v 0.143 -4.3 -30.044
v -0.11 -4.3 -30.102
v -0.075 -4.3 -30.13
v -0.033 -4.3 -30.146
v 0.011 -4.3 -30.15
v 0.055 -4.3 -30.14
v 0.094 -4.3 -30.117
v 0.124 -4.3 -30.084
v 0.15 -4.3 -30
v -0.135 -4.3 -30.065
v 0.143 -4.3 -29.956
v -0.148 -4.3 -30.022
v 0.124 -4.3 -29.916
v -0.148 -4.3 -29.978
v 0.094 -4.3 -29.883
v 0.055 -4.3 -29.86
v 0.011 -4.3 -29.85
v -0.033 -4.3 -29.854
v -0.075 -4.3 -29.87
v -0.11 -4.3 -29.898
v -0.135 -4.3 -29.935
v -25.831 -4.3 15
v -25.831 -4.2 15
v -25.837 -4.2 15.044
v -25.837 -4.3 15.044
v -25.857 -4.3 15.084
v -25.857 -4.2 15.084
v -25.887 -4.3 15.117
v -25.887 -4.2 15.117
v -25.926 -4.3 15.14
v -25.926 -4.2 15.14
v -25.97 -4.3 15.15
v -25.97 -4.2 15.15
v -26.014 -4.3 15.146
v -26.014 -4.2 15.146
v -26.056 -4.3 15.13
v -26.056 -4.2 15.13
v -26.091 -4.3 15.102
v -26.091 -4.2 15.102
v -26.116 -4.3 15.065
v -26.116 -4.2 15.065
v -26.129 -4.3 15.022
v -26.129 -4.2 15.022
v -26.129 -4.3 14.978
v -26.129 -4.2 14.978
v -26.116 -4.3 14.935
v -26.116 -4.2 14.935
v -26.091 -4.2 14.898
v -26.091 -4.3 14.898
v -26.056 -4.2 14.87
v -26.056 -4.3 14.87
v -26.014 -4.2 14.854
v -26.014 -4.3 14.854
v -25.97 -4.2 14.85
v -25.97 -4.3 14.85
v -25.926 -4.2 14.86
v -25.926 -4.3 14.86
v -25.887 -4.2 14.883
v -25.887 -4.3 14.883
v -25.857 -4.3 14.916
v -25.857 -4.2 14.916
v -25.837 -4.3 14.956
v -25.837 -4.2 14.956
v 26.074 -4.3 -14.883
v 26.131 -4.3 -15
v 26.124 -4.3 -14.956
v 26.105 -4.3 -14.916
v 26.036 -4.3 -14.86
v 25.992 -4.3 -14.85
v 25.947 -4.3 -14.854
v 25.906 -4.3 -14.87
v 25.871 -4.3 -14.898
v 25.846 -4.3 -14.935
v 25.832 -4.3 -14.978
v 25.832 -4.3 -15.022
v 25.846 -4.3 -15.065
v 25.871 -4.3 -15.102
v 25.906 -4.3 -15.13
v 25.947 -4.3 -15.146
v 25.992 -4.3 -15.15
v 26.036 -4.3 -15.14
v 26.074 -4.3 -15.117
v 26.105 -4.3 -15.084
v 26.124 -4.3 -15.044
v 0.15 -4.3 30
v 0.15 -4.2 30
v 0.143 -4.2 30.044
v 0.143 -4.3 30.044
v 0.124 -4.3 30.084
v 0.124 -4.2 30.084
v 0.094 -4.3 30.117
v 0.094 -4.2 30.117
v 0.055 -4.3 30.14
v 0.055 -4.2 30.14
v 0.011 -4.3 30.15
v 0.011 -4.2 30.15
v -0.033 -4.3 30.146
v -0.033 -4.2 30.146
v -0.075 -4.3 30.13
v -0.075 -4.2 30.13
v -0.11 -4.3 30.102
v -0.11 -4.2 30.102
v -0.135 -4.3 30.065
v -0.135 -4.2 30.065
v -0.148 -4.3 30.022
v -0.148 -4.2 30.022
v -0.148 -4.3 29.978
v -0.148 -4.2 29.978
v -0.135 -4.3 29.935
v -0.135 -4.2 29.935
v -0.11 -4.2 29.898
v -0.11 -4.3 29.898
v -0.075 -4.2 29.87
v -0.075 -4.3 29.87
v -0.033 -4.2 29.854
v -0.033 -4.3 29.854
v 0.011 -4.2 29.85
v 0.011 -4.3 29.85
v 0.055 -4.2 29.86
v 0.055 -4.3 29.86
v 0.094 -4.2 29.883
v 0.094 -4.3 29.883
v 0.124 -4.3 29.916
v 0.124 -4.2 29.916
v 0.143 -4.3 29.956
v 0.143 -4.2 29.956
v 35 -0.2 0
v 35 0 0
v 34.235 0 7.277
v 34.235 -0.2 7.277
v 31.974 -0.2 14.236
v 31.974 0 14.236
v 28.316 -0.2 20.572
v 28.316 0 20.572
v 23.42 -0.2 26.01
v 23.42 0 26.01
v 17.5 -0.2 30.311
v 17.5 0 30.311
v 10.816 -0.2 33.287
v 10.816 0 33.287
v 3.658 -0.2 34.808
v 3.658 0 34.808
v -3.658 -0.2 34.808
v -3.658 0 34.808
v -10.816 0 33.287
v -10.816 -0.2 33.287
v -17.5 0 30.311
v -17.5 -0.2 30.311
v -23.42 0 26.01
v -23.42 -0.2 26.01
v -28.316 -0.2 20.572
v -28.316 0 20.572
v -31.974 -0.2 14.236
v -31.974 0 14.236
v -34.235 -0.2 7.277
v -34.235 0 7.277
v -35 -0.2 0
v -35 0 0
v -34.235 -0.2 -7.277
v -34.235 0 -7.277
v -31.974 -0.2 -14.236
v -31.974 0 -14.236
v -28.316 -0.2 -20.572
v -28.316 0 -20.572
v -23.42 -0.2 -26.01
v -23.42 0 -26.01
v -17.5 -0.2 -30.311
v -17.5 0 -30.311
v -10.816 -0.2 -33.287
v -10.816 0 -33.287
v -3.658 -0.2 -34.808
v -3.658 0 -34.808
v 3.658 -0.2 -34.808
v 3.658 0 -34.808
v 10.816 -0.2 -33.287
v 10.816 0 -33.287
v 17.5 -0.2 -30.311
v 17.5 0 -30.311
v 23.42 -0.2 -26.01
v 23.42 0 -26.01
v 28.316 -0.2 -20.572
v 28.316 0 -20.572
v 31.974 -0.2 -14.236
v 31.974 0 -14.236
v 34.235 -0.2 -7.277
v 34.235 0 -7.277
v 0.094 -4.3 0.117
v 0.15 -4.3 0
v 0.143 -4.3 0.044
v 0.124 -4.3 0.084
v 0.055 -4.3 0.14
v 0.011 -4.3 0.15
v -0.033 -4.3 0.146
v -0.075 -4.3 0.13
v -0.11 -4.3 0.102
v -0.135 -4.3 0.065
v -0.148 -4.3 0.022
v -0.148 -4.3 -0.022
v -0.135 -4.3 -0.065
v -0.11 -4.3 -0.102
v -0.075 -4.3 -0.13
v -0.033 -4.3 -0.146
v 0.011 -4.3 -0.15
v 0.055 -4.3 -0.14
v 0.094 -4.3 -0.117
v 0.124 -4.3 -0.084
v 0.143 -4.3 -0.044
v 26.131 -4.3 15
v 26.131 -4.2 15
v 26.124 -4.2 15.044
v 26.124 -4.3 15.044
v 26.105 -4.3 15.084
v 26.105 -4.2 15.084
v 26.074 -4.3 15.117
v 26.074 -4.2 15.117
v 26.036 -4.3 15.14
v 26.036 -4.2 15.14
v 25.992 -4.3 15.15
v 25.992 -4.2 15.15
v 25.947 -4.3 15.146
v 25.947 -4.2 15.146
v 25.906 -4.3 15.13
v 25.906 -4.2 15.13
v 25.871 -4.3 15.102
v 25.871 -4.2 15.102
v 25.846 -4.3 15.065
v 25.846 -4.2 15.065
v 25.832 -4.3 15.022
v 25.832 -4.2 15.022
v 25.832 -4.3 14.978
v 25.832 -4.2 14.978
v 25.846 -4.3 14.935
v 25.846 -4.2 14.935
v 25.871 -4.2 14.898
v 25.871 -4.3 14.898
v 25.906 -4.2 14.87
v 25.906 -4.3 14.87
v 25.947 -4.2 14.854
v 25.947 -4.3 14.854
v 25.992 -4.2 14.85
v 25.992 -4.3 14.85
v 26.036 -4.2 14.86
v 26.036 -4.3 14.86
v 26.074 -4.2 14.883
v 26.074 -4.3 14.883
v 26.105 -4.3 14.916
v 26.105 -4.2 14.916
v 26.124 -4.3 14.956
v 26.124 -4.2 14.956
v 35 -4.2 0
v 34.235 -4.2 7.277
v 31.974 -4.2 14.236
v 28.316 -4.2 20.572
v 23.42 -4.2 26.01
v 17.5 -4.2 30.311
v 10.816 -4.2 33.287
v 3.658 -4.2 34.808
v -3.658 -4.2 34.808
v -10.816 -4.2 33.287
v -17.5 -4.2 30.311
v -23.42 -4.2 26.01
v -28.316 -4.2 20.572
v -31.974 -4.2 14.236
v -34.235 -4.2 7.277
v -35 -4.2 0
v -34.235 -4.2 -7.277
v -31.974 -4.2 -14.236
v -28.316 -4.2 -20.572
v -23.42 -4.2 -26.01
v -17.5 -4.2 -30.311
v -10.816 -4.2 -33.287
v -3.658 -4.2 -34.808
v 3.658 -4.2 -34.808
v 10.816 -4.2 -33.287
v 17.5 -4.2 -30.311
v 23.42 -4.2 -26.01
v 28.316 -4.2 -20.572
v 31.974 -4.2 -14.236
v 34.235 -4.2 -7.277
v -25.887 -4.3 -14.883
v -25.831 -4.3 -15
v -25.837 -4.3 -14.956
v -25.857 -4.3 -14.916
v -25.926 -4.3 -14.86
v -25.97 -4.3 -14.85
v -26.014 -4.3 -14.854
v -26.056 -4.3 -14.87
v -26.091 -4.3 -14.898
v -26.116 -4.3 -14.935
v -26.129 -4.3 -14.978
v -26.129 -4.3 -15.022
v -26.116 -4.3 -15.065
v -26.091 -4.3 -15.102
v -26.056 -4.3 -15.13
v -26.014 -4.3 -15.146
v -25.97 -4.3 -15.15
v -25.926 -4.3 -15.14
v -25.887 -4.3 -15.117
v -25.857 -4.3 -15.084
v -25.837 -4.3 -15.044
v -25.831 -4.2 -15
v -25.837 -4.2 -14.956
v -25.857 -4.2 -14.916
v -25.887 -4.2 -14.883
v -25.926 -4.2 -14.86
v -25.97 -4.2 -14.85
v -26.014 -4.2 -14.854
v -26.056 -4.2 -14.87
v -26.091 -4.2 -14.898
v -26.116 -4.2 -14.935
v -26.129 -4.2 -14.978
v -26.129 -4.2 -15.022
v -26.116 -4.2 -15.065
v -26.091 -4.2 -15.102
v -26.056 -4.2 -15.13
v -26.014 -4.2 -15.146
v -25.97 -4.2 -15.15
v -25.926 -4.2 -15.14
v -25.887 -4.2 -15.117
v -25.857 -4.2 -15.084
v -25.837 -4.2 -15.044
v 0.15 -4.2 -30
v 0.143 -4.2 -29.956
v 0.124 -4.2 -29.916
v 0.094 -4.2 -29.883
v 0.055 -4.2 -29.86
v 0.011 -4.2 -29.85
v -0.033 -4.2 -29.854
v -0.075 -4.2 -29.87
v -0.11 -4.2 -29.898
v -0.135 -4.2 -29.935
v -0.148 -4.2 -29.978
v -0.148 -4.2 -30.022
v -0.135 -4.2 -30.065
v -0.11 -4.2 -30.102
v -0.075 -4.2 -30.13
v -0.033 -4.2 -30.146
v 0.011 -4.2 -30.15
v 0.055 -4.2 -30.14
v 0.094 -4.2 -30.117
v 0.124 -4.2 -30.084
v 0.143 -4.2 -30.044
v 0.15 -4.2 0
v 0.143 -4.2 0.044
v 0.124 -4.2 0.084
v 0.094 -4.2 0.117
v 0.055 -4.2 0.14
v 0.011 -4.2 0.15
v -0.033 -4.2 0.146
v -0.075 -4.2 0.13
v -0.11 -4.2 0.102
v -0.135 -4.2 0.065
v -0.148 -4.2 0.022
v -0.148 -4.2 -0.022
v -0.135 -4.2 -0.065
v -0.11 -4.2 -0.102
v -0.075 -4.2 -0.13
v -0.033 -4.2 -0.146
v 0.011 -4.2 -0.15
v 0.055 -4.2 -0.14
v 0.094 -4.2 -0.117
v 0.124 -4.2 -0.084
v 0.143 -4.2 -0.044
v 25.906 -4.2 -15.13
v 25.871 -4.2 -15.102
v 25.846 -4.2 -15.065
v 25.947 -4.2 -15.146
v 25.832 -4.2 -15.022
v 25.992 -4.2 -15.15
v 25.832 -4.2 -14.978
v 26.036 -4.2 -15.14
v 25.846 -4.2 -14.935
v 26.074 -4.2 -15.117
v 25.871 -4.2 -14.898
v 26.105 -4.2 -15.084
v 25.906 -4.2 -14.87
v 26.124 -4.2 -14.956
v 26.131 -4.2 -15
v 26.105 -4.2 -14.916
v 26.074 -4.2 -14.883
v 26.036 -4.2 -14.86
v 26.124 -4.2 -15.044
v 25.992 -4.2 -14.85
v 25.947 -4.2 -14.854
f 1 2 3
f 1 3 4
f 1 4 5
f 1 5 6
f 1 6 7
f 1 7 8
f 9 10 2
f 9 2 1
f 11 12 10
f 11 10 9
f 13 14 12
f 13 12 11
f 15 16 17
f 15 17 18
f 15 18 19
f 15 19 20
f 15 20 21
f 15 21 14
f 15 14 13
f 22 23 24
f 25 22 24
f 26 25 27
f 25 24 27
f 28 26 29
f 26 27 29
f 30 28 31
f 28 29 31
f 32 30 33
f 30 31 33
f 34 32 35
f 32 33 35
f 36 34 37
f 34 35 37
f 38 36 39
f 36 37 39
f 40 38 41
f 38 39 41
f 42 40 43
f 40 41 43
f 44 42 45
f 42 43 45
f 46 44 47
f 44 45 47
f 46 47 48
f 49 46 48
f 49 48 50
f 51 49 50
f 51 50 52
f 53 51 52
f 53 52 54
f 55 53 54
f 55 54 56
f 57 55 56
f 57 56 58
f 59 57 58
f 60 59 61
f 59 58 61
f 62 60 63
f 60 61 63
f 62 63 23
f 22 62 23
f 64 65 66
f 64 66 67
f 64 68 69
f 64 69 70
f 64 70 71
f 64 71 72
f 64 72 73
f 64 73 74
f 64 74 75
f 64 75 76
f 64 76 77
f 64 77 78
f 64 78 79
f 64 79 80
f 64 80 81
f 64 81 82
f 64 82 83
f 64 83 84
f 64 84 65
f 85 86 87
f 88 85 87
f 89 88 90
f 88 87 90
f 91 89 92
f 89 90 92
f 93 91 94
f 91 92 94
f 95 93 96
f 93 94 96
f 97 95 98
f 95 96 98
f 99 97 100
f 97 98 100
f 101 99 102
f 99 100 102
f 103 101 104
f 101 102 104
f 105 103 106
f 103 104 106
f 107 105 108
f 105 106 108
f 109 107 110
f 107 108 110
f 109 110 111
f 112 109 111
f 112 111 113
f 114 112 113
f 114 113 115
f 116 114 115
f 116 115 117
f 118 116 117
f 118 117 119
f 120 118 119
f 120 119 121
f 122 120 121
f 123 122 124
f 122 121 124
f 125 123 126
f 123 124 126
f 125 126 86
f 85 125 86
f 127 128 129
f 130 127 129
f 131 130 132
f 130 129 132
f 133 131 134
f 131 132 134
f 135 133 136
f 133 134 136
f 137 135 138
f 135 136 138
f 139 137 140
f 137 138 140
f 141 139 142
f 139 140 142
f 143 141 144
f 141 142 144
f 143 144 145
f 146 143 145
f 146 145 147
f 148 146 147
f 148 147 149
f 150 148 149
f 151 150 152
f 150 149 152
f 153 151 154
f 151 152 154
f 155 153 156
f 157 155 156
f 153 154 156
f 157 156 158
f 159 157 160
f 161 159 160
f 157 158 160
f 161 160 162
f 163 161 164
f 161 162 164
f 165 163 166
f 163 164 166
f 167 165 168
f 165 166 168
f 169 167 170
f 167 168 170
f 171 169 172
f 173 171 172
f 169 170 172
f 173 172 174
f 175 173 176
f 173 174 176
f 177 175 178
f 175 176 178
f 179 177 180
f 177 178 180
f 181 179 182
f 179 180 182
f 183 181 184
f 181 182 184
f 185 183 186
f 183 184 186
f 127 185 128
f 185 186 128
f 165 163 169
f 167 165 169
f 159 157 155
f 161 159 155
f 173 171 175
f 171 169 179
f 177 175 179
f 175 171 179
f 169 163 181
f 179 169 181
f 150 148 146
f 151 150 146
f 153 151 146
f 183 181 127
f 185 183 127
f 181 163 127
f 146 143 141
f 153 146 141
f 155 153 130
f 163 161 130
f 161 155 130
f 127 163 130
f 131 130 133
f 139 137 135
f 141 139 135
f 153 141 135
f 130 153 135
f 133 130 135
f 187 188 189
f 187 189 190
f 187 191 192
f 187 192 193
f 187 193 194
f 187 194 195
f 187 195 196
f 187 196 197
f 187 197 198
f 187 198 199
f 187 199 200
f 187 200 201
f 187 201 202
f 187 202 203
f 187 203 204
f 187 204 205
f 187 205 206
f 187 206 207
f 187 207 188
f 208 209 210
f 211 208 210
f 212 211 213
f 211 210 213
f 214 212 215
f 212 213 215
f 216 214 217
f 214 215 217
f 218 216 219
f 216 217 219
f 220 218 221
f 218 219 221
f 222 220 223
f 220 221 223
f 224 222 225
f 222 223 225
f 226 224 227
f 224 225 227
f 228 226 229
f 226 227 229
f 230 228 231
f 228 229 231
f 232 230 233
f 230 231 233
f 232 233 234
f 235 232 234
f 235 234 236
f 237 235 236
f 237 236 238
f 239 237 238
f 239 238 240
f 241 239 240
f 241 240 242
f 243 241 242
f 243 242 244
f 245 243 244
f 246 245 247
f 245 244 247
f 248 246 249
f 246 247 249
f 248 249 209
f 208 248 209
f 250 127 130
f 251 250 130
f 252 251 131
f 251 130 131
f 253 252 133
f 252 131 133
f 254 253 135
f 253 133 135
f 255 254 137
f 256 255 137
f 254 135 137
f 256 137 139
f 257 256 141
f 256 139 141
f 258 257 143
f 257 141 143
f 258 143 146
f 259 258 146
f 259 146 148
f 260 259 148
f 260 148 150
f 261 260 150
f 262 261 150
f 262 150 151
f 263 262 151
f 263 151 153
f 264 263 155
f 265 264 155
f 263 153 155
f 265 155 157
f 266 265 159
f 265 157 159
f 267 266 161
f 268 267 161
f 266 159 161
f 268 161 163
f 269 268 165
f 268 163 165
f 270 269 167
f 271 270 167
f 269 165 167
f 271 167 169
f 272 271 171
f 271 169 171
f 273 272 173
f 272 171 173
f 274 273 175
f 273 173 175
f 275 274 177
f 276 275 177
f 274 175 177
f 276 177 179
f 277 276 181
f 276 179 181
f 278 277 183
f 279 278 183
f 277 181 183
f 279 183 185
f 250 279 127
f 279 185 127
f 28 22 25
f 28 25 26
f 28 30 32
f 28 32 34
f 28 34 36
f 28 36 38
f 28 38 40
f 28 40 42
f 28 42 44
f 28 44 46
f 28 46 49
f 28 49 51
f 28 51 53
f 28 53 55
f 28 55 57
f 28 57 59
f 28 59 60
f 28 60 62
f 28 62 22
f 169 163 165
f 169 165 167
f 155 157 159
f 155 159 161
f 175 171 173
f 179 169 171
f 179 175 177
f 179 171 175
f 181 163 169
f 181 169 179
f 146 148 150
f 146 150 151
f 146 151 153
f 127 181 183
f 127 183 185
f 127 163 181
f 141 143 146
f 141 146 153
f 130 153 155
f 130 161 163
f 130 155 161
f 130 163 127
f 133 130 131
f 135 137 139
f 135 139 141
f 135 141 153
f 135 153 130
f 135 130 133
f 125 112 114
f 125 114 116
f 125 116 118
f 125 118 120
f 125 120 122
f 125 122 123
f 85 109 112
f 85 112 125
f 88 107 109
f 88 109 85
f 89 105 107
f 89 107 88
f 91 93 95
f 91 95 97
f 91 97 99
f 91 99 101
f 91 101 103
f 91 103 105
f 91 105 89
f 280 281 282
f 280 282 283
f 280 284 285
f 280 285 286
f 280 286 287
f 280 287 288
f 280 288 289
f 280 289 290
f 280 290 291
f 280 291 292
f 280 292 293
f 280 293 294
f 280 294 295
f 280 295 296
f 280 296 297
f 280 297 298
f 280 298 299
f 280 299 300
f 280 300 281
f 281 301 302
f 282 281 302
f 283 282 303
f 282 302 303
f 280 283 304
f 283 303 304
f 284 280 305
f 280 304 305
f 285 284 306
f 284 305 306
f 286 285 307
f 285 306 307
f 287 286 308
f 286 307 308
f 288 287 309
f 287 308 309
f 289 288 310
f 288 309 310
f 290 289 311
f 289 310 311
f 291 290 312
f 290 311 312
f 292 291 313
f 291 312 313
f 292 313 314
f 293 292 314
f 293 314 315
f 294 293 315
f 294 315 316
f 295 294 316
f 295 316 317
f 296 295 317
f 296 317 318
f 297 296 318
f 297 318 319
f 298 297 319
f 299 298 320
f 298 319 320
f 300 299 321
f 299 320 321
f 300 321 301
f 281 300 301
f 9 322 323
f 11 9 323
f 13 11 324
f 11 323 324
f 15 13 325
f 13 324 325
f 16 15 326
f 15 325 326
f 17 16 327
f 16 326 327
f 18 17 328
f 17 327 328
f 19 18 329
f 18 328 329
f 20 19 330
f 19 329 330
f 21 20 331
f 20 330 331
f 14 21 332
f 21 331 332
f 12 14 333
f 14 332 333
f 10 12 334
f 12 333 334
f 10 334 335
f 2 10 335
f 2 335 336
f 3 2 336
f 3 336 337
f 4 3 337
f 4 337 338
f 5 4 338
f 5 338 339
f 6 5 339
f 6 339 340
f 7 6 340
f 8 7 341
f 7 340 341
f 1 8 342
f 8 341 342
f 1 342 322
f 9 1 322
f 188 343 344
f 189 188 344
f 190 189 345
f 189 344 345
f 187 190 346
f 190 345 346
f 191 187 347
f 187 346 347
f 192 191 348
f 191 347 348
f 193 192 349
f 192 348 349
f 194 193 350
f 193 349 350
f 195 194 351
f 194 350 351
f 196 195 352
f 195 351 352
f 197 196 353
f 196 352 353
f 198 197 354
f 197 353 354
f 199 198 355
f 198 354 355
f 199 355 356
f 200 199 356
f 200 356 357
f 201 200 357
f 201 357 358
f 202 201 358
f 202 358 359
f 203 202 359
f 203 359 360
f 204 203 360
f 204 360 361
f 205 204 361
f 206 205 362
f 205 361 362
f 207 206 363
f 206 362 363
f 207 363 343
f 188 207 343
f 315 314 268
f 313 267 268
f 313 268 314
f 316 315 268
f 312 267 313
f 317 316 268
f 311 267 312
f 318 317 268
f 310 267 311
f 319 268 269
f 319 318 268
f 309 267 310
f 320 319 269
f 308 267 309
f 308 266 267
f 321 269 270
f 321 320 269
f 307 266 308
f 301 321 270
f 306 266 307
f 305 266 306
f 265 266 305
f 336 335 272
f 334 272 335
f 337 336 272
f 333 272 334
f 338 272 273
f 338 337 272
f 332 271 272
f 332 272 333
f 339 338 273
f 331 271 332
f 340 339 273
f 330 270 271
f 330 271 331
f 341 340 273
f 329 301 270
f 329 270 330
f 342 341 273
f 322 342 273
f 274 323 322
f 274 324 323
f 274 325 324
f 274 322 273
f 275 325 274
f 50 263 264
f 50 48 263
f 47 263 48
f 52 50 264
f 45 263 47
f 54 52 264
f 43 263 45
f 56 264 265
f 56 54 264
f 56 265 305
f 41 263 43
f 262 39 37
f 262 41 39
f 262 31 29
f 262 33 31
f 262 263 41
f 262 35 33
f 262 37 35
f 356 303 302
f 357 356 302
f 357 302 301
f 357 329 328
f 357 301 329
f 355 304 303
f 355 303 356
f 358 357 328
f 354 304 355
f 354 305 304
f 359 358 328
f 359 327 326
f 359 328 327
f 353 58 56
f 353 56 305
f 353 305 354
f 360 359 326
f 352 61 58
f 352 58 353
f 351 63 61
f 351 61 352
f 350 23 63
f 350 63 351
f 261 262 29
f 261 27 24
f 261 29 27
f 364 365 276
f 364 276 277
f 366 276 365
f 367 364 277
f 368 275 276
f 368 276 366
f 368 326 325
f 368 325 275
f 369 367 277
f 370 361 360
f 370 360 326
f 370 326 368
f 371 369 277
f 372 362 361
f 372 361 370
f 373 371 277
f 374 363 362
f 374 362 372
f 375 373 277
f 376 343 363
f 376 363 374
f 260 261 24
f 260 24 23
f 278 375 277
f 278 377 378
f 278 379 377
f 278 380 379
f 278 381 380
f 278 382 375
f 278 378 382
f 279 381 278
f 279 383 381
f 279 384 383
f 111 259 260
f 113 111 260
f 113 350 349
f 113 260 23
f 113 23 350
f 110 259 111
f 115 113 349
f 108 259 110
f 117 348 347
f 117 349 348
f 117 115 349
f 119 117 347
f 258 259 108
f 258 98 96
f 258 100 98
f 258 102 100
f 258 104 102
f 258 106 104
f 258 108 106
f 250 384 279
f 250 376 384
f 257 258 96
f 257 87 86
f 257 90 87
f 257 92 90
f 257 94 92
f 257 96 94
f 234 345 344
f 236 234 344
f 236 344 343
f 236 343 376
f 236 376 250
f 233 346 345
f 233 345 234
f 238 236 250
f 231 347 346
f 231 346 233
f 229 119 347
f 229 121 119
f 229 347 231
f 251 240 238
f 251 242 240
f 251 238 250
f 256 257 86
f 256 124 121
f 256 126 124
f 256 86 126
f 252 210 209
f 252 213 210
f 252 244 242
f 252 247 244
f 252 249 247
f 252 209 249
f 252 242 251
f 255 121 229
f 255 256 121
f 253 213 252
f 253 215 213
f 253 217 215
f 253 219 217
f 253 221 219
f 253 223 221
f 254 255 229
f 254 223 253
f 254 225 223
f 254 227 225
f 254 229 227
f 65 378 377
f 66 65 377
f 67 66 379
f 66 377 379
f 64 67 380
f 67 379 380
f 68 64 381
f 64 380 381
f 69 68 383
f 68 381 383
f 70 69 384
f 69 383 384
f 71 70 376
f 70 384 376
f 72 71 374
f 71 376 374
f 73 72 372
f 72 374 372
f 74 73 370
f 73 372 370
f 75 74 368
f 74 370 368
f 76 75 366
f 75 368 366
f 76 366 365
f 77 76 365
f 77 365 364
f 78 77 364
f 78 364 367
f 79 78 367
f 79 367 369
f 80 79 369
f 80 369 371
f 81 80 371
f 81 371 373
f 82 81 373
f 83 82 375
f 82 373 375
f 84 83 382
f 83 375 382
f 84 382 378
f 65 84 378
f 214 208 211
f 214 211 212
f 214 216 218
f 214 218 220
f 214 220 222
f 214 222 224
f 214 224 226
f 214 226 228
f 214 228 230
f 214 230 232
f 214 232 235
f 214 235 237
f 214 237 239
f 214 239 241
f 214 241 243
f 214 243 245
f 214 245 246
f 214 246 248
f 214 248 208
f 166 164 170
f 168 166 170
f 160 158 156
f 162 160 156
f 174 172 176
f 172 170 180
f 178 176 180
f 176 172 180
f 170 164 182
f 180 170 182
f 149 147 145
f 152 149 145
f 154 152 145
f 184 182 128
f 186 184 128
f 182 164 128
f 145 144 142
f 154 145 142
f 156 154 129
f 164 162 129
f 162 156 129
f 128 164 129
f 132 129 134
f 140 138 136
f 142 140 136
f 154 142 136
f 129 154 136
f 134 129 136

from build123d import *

# Parameters (mm, degrees)
F0_R     = 35
F1_DEPTH = 0.2
F2_R     = 35
F3_DEPTH = 4
F4_R     = 0.15
F5_DEPTH = 0.1


with BuildPart() as f1:
    # F0 (on Front) → F1 (new body)
    with BuildSketch(Plane.XZ):
        Circle(F0_R)
    extrude(amount=F1_DEPTH)


with BuildPart() as f3:
    # F2 (on face) → F3 (new body)
    with BuildSketch(Plane.XZ.offset(0.2)):
        Circle(F2_R)
    extrude(amount=F3_DEPTH)

    # F4 (on face) → F5 (join)
    with BuildSketch(Plane.XZ.offset(4.2)):
        with Locations((0, 30)):
            Circle(F4_R)
        with Locations((-25.980762, 15)):
            Circle(F4_R)
        with Locations((-25.980762, -15)):
            Circle(F4_R)
        with Locations((0, -30)):
            Circle(F4_R)
        with Locations((25.980762, -15)):
            Circle(F4_R)
        with Locations((25.980762, 15)):
            Circle(F4_R)
        Circle(F4_R)
    extrude(amount=F5_DEPTH)


solid = Compound([f1.part, f3.part])
